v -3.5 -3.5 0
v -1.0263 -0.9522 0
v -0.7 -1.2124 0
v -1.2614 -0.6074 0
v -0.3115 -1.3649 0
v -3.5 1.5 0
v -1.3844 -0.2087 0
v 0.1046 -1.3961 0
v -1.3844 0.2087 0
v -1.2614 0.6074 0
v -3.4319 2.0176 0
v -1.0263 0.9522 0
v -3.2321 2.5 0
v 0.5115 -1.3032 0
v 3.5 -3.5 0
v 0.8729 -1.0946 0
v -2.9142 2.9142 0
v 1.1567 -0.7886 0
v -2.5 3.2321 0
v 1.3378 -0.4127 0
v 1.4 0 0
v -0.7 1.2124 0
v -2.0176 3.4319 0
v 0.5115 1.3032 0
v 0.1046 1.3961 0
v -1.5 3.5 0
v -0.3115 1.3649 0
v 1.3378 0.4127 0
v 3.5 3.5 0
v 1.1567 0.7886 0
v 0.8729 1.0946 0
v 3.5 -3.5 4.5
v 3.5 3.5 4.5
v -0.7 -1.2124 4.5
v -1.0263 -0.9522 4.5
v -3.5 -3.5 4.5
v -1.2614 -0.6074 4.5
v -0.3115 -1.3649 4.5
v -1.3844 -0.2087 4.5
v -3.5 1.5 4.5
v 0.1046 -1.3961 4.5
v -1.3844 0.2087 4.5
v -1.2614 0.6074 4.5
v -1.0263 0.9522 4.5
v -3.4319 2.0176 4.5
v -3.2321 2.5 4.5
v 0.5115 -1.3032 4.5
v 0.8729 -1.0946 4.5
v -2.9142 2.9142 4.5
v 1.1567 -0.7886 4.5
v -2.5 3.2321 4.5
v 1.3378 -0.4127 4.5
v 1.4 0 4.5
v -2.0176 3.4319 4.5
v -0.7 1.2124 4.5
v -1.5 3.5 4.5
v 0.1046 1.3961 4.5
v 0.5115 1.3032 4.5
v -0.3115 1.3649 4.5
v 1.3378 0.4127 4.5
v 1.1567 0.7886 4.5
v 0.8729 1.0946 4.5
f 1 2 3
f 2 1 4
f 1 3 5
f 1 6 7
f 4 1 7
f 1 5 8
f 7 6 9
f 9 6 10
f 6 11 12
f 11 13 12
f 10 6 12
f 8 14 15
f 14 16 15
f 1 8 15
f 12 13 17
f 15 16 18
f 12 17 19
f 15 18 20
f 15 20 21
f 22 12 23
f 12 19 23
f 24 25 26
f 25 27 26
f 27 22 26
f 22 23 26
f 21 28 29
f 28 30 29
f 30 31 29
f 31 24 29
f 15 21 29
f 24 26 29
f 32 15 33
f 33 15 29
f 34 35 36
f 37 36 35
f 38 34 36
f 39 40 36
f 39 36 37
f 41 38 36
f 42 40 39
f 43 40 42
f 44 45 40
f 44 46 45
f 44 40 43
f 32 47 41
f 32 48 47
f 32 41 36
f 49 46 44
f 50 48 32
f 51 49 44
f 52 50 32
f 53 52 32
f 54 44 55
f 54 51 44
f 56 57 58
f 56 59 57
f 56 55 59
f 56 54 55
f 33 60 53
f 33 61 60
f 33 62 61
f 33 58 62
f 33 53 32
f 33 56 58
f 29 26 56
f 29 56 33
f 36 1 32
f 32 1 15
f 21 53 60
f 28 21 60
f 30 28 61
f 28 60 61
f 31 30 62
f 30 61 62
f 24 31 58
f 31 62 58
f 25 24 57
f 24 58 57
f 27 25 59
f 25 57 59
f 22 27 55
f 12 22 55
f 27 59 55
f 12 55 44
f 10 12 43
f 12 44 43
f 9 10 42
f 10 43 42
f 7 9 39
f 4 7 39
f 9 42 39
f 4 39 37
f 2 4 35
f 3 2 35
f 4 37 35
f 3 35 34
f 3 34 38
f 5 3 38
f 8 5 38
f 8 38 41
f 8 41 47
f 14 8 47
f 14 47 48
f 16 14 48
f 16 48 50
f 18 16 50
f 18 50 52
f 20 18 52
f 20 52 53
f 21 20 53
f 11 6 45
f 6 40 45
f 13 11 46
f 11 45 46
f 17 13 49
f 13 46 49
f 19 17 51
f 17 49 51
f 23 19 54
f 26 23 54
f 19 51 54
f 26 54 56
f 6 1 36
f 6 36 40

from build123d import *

# Parameters (mm, degrees)
SKETCH1_W           = 7
SKETCH1_H           = 7
BOSS_EXTRUDE1_DEPTH = 4.5
SKETCH2_R           = 1.4
CUT_EXTRUDE1_DEPTH  = 7.68954408
FILLET1_R           = 2


with BuildPart() as part:
    # Sketch1 → Boss-Extrude1 (new body)
    with BuildSketch(Plane.XY):
        Rectangle(SKETCH1_W, SKETCH1_H)
    extrude(amount=BOSS_EXTRUDE1_DEPTH)

    # Sketch2 → Cut-Extrude1 (cut, through all)
    with BuildSketch(Plane.XY.offset(4.5)):
        Circle(SKETCH2_R)
    extrude(amount=-CUT_EXTRUDE1_DEPTH, mode=Mode.SUBTRACT)

    # Fillet1
    fillet1_edges = [part.edges().sort_by_distance(p)[0] for p in [
        (-3.5, 3.5, 2.25),
    ]]
    fillet(fillet1_edges, radius=FILLET1_R)


solid = part.part
